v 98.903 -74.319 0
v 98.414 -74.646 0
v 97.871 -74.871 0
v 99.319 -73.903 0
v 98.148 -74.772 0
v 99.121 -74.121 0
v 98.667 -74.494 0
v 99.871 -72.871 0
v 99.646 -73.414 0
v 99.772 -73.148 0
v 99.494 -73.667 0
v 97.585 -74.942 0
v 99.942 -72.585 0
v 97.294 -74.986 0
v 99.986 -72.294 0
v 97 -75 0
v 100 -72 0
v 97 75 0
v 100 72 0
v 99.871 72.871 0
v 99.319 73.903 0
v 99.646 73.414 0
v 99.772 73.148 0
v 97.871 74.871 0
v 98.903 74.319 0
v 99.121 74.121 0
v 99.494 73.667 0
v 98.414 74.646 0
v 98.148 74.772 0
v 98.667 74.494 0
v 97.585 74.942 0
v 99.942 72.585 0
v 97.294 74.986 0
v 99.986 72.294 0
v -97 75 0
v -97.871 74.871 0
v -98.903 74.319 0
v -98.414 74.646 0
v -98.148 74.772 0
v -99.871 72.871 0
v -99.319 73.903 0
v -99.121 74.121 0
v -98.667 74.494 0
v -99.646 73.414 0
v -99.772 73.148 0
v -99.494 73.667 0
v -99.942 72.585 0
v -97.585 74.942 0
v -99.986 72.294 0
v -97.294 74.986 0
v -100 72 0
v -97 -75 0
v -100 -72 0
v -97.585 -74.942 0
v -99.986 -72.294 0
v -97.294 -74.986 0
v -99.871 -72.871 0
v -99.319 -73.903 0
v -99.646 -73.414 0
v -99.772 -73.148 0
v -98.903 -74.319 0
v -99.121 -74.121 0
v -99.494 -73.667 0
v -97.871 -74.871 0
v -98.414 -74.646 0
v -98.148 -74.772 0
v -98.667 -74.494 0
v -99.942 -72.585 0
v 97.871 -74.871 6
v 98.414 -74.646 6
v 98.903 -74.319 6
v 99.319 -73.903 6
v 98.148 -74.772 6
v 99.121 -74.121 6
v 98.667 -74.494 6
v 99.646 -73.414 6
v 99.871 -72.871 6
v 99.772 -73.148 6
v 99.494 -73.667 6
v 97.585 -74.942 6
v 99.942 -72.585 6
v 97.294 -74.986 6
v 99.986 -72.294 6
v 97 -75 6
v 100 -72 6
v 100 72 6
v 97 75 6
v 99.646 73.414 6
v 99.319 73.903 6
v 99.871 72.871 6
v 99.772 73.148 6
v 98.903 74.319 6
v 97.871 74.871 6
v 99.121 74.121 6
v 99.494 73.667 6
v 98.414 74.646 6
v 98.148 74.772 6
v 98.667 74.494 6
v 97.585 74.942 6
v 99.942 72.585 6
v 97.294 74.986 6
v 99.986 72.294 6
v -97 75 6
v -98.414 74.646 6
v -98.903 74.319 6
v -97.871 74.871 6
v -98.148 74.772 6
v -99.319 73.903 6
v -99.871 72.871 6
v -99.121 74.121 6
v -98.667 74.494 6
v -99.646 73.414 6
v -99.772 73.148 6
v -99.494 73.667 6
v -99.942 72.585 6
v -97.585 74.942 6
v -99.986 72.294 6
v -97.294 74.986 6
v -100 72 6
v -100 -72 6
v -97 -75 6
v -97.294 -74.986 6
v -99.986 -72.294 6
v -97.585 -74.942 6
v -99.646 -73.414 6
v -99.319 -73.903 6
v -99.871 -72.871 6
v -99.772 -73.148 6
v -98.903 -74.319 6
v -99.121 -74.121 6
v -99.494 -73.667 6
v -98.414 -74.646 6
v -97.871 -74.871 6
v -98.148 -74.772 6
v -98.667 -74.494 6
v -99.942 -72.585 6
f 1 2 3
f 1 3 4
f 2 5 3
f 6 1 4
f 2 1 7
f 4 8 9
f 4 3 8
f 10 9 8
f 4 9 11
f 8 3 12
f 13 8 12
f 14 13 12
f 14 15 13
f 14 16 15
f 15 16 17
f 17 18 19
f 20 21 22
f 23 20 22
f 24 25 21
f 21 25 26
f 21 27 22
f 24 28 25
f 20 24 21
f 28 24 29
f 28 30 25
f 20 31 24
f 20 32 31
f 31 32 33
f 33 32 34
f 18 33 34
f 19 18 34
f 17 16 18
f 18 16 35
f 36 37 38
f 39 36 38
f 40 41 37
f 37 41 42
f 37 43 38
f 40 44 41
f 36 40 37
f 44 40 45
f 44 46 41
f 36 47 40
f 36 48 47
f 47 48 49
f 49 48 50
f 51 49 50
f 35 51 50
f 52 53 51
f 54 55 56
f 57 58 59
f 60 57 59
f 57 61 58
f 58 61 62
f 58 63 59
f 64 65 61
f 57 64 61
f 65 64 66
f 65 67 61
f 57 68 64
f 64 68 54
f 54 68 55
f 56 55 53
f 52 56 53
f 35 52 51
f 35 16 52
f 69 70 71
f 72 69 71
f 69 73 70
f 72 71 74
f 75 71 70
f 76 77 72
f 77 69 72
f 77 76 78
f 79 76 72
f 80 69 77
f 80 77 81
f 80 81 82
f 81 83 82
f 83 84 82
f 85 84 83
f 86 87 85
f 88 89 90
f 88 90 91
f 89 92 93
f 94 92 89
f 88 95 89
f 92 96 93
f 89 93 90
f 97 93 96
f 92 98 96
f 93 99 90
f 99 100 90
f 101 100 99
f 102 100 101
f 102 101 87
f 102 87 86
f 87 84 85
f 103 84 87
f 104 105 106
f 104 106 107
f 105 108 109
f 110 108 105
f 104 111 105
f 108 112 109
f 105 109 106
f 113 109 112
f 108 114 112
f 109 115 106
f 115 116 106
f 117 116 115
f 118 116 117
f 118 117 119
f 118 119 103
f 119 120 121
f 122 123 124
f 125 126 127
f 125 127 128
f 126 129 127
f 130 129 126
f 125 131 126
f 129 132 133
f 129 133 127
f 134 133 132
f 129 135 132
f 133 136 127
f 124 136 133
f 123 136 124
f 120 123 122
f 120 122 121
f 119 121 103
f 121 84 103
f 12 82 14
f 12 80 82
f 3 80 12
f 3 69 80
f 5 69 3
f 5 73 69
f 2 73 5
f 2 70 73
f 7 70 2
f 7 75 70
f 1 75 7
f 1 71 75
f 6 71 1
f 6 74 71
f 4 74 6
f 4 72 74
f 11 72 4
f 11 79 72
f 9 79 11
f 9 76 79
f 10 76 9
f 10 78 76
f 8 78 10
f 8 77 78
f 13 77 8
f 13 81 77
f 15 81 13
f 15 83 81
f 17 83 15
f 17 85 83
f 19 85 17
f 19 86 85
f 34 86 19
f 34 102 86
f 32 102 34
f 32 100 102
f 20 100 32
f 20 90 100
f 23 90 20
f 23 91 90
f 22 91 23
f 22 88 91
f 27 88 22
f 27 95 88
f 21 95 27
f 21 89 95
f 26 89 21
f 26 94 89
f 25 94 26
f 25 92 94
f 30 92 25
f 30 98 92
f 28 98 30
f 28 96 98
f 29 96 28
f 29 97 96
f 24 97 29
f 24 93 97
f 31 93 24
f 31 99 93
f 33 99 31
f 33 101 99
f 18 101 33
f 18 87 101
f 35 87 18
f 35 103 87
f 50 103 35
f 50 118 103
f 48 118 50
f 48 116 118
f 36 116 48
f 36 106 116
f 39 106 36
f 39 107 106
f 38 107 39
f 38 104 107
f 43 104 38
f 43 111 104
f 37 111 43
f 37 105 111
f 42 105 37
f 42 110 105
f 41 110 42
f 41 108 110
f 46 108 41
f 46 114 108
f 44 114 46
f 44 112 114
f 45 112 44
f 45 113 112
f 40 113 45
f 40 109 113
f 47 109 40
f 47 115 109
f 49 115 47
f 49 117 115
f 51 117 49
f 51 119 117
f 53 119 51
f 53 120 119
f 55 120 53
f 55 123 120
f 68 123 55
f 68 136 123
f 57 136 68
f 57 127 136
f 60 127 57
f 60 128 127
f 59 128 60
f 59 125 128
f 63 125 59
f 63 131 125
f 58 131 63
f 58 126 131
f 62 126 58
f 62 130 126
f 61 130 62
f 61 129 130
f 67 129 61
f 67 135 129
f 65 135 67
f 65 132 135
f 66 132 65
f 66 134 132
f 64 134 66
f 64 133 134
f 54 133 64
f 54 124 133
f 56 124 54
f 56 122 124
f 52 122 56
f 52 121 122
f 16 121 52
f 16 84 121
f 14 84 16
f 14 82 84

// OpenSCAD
$fn = 64;

length = 200;
width  = 150;
thickness = 6;

corner_radius = 3;

module rounded_plate(l, w, t, r){
    r2 = min(r, min(l, w)/2);
    linear_extrude(height = t)
        offset(r = r2)
            square([l - 2*r2, w - 2*r2], center = true);
}

color([0.75, 0.77, 0.80])
    rounded_plate(length, width, thickness, corner_radius);
